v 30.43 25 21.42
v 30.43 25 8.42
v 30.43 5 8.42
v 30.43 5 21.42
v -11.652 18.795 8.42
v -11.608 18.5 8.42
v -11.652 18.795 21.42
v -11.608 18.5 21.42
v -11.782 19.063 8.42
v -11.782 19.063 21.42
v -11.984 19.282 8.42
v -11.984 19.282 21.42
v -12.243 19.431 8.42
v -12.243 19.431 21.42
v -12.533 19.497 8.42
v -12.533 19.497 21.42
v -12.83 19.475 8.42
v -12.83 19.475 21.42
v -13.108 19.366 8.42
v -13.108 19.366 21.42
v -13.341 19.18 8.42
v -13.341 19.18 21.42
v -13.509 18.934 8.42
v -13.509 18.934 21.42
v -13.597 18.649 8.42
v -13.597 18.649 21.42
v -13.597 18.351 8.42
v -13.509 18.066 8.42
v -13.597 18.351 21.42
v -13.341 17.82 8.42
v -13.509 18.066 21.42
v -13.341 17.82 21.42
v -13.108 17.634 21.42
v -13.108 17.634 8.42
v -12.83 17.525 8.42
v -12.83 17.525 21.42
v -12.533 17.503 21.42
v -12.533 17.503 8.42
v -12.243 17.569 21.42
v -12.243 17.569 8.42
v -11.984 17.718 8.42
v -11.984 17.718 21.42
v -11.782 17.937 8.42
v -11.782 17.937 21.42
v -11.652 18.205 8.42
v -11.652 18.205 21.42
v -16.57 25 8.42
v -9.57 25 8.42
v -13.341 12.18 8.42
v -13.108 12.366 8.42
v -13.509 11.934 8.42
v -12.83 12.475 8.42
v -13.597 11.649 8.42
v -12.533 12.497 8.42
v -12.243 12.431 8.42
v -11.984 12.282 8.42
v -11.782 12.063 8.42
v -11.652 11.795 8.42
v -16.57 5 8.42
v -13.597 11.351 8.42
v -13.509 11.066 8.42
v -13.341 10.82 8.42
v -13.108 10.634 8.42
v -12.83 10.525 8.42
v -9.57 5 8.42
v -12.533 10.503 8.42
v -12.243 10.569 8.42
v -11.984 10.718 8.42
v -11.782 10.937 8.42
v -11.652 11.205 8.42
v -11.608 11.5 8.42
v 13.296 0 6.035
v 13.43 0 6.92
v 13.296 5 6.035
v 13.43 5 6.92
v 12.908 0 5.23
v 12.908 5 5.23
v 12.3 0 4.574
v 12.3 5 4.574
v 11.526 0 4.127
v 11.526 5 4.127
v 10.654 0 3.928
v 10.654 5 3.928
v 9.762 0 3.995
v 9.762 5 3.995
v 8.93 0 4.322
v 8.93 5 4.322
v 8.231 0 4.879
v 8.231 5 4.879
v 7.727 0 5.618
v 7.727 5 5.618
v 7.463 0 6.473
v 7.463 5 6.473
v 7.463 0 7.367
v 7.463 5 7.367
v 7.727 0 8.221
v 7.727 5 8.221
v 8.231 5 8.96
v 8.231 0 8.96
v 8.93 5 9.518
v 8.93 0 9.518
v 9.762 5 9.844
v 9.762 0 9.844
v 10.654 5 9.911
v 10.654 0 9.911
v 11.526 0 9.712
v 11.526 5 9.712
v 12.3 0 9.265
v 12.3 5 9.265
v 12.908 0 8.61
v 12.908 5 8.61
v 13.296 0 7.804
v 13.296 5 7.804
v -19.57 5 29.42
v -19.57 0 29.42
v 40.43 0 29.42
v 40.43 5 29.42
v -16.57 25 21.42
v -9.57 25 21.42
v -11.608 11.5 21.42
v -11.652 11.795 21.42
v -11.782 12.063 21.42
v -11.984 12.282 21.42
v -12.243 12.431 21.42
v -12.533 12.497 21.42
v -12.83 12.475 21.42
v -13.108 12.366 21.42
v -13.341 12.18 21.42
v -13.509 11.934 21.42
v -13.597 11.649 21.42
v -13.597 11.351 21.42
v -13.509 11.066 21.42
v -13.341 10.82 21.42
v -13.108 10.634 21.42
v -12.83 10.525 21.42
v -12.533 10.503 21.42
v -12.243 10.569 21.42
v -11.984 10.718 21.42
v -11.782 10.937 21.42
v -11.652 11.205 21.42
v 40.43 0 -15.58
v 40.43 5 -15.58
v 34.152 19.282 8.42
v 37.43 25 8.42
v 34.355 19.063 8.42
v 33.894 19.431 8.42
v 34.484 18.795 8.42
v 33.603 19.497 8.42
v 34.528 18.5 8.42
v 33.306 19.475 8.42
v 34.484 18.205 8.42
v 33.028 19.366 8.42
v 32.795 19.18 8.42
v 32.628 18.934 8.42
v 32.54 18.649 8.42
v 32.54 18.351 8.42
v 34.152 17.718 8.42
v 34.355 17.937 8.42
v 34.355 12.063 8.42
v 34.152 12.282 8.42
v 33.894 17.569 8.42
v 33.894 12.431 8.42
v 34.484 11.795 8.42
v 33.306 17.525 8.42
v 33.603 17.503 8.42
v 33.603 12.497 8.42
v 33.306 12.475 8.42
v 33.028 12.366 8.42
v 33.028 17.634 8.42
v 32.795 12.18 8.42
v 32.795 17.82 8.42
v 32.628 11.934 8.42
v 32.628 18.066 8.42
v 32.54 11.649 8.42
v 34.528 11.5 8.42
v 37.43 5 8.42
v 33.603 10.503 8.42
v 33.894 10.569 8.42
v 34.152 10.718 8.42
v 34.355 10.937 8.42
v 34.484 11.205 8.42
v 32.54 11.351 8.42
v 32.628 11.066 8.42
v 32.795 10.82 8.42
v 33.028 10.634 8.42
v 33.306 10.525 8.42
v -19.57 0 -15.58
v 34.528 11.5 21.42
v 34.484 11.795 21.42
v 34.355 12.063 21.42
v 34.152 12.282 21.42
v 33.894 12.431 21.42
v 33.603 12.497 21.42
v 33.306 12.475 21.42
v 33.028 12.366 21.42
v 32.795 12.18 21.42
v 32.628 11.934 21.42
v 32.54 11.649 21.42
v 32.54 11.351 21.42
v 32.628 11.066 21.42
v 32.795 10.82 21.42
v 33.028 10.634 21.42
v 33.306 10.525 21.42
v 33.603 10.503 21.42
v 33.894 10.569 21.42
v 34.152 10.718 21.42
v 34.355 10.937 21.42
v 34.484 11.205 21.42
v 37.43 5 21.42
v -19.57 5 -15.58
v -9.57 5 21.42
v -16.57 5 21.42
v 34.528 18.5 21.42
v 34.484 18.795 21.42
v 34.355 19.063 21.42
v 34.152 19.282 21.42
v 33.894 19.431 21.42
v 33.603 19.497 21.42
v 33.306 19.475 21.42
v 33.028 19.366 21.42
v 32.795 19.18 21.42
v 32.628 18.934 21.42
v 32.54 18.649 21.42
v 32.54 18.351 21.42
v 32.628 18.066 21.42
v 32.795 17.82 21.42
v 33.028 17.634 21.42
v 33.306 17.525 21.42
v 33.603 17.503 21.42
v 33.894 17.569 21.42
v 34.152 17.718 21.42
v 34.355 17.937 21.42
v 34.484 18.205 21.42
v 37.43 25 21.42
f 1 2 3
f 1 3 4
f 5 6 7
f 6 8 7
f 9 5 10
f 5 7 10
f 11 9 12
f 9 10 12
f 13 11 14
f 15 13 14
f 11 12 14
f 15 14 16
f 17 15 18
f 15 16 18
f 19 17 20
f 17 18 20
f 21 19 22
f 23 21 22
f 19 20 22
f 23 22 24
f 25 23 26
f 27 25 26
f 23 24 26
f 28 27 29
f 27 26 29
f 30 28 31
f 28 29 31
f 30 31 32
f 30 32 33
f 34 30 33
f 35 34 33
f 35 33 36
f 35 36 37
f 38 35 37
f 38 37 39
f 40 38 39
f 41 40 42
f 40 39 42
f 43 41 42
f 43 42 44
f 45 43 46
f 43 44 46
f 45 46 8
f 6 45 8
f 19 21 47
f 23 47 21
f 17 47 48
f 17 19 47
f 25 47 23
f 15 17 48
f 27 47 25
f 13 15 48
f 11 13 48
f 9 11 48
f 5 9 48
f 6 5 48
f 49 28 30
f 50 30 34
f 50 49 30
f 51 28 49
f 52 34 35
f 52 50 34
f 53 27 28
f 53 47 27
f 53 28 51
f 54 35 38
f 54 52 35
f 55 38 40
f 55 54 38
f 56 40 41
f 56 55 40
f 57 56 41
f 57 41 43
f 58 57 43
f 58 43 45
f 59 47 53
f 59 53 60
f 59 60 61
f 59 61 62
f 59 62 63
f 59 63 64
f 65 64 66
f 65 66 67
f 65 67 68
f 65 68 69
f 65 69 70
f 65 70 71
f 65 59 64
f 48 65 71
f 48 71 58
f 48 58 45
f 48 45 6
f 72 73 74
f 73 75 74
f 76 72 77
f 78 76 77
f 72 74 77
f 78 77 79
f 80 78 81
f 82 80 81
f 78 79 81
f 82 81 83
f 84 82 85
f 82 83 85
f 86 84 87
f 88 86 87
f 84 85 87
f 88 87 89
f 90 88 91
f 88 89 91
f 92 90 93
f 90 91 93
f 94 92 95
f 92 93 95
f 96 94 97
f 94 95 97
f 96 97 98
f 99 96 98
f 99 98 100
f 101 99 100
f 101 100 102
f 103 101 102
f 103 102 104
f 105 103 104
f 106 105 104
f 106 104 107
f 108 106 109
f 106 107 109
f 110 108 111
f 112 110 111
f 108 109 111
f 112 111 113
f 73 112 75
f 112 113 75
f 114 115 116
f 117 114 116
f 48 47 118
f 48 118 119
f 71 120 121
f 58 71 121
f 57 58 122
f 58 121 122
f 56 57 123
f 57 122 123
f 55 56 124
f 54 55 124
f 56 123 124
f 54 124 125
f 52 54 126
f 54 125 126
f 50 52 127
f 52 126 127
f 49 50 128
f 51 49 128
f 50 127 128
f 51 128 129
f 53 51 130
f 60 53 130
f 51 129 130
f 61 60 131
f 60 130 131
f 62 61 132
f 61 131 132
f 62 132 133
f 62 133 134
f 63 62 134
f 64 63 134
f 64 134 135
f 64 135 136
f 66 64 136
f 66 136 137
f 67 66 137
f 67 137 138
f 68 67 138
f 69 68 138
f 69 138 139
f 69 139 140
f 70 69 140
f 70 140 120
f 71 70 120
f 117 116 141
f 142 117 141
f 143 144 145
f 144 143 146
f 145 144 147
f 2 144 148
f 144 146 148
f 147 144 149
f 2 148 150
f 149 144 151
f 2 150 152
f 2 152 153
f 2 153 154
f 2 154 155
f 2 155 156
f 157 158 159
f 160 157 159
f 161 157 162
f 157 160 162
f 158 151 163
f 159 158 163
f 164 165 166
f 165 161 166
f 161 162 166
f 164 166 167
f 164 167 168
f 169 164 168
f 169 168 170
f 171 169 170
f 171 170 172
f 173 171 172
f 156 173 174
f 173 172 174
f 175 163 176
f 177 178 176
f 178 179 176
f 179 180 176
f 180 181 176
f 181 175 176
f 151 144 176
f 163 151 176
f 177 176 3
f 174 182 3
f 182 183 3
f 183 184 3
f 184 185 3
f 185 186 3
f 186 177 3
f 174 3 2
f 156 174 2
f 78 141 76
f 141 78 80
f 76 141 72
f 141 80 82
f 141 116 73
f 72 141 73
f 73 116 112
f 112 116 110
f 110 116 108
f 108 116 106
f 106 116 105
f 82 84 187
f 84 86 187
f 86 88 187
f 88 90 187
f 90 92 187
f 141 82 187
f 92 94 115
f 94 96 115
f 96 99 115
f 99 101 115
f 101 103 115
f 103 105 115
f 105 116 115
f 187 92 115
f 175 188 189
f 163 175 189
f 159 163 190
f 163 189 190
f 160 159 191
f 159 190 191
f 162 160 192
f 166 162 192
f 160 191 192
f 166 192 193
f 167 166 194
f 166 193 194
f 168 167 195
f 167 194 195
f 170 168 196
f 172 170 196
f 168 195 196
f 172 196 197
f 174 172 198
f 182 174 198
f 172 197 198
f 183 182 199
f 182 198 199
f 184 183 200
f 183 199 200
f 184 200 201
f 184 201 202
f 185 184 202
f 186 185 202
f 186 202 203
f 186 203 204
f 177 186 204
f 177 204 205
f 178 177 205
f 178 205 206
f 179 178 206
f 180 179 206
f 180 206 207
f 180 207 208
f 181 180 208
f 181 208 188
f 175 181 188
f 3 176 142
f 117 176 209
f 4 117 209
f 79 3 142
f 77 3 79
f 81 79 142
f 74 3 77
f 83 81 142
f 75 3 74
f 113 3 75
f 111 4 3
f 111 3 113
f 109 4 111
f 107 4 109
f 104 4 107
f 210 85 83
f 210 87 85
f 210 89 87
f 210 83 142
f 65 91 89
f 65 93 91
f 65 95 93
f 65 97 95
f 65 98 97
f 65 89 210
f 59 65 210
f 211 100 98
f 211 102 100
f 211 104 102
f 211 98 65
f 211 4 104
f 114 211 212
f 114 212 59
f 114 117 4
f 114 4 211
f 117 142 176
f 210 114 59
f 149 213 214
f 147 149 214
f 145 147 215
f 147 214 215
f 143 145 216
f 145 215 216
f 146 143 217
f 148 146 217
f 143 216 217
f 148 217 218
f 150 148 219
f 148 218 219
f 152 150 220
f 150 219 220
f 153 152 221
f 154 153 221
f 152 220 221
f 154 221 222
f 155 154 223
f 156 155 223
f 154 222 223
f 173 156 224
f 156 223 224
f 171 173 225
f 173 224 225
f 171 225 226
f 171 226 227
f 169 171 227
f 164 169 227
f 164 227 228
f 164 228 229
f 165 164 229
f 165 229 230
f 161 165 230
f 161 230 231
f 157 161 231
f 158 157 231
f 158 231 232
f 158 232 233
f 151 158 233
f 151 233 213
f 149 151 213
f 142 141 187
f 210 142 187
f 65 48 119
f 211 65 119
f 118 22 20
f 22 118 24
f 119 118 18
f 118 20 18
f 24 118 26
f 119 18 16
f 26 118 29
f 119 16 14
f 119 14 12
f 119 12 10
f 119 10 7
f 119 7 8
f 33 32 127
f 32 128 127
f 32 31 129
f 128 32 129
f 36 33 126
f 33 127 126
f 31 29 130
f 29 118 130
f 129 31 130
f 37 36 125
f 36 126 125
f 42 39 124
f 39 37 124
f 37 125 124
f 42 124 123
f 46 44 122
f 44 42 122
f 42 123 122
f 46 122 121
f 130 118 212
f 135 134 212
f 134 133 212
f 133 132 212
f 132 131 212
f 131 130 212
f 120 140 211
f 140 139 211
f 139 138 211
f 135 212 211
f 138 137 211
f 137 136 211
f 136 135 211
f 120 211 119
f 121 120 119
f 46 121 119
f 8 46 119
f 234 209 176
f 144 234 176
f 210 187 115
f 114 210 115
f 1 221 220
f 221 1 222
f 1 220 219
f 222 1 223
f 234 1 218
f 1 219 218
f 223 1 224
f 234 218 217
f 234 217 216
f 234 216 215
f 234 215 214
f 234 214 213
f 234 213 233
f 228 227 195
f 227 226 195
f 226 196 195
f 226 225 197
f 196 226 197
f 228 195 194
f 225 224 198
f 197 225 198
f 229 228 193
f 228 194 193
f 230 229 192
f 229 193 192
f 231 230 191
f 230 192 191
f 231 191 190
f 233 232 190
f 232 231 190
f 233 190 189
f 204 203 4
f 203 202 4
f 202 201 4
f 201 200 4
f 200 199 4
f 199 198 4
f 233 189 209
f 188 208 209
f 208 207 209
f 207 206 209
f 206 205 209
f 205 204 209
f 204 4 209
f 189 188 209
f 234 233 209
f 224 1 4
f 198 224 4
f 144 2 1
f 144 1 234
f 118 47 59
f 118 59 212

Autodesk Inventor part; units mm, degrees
ref_plane "YZ Plane" through (0, 0, 0) normal (1, 0, 0) x (0, 1, 0)
ref_plane "XZ Plane" through (0, 0, 0) normal (0, 1, 0) x (-1, 0, 0)
ref_plane "XY Plane" through (0, 0, 0) normal (0, 0, 1) x (1, 0, 0)
sketch "Sketch1" plane through (0, 0, 0) normal (0, 1, 0) x (-1, 0, 0)
  line L0 (19.5703, 29.4197) -> (-40.4297, 29.4197)
  line L1 (-40.4297, 29.4197) -> (-40.4297, -15.5803)
  line L2 (-40.4297, -15.5803) -> (19.5703, -15.5803)
  line L3 (19.5703, -15.5803) -> (19.5703, 29.4197)
  point P0 (0, 0)
  dimension "d2" = 60
  dimension "d3" = 45
extrude "Extrusion1" add sketch "Sketch1" along normal blind 5
sketch "Sketch2" plane through (0, 5, 0) normal (0, 1, 0) x (1, 0, 0)
  line L0 (-19.5703, 15.5803) -> (-19.5703, -29.4197) projected
  line L1 (40.4297, -29.4197) -> (40.4297, 15.5803) projected
  line L2 (-19.5703, -29.4197) -> (40.4297, -29.4197) projected
  line L3 (40.4297, 15.5803) -> (-19.5703, 15.5803) projected
  circle A0 centre (10.4297, -6.9197) radius 3
  point P0 (0, 0)
  point P1 (13.4635, -6.9197)
extrude "Extrusion2" cut sketch "Sketch2" against normal up to next contours A0
sketch "Sketch3" plane through (0, 0, 0) normal (0, -1, 0) x (1, 0, 0)
  circle A0 centre (10.4297, 6.9197) radius 3 projected
  circle A1 centre (10.4297, 6.9197) radius 5
  point P0 (0, 0)
  dimension "d9" = 10
extrude "Extrusion3" add sketch "Sketch3" along normal blind 10
sketch "Sketch6" plane through (0, 5, 0) normal (0, 1, 0) x (1, 0, 0)
  line L0 (-19.5703, -29.4197) -> (40.4297, -29.4197) projected
  line L1 (-19.5703, -29.4197) -> (-19.5703, -21.4197)
  line L2 (-19.5703, 15.5803) -> (-19.5703, -29.4197) projected
  line L3 (-19.5703, -21.4197) -> (40.4297, -21.4197)
  line L4 (40.4297, -29.4197) -> (40.4297, 15.5803) projected
  line L5 (10.4297, -29.4197) -> (10.4297, 15.5803)
  line L6 (40.4297, 15.5803) -> (-19.5703, 15.5803) projected
  line L7 (10.4297, -21.4197) -> (37.4297, -21.4197)
  line L8 (10.4297, -21.4197) -> (-16.5703, -21.4197)
  line L9 (-16.5703, -8.4197) -> (-9.5703, -8.4197)
  line L10 (37.4297, -21.4197) -> (37.4297, -8.4197)
  line L11 (37.4297, -8.4197) -> (30.4297, -8.4197)
  line L12 (30.4297, -8.4197) -> (30.4297, -21.4197)
  line L13 (-9.5703, -8.4197) -> (-9.5703, -21.4197)
  line L14 (-16.5703, -8.4197) -> (-16.5703, -21.4197)
  point P0 (0, 0)
  dimension "d22" = 8
  dimension "d23" = 27
  dimension "d24" = 27
  dimension "d25" = 13
  dimension "d26" = 7
  dimension "d27" = 13
  dimension "d28" = 7
extrude "Extrusion5" add sketch "Sketch6" along normal blind 20 contours L14 L9 L13 L3 | L12 L11 L10 L3
sketch "Sketch7" plane through (-16.5703, 5, 21.4197) normal (0, 0, 1) x (1, 0, 0)
  line L0 (7, 0) -> (7, 20) projected
  line L1 (7, 10) -> (5, 10)
  line L2 (5, 10) -> (5, 20)
  line L3 (5, 10) -> (5, 0)
  line L4 (7, 0) -> (0, 0) projected
  line L5 (0, 0) -> (5, 0)
  line L6 (2.5, 0) -> (2.5, 20)
  line L7 (47, 0) -> (47, 20) projected
  line L8 (47, 10) -> (49, 10)
  line L9 (49, 10) -> (49, 20)
  line L10 (49, 10) -> (49, 0)
  line L11 (49, 0) -> (53.9219, 0)
  line L12 (51.4609, 0) -> (51.4609, 20)
  point P0 (16.5703, -5)
  dimension "d31" = 2
  dimension "d32" = 2
sketch "Sketch8" plane through (30.4297, 5, 21.4197) normal (0, 0, 1) x (1, 0, 0)
  line L0 (2.0988, 10) -> (3.0988, 10)
  line L1 (7, 0) -> (7, 20) projected
  line L2 (3.0988, 12.5) -> (3.0988, 13.5)
  line L3 (0, 0) -> (0, 20) projected
  circle A0 centre (3.0988, 13.5) radius 1
  line L4 (3.0988, 7.5) -> (3.0988, 6.5)
  circle A1 centre (3.0988, 6.5) radius 1
  line L5 (-42.0376, 10) -> (-43.0376, 10)
  line L6 (-43.0376, 12.5) -> (-43.0376, 13.5)
  line L7 (-43.0376, 7.5) -> (-43.0376, 6.5)
  circle A2 centre (-43.0376, 13.5) radius 1
  circle A3 centre (-43.0376, 6.5) radius 1
  point P0 (-30.4297, -5)
extrude "Extrusion6" cut sketch "Sketch8" against normal blind 14
thread "Thread1" size "M2x0.4" class "6H" standard "ANSI Metric M Profile" full length
thread "Thread2" size "M2x0.4" class "6H" standard "ANSI Metric M Profile" full length
thread "Thread3" size "M2x0.4" class "6H" standard "ANSI Metric M Profile" full length
thread "Thread4" size "M2x0.4" class "6H" standard "ANSI Metric M Profile" full length
sketch "Sketch9" plane through (-19.5703, 0, 29.4197) normal (0, 0, 1) x (1, 0, 0)
  line L0 (35, 0) -> (25, 0) projected
  line L1 (25, -10) -> (35, -10) projected
  line L2 (25, 0) -> (25, -10)
  line L3 (25, -10) -> (35, -10)
  line L4 (35, -10) -> (35, 0)
  line L5 (35, 0) -> (35, -10) projected
  point P0 (19.5703, 0)
extrude "Extrusion7" cut sketch "Sketch9" against normal blind 40
